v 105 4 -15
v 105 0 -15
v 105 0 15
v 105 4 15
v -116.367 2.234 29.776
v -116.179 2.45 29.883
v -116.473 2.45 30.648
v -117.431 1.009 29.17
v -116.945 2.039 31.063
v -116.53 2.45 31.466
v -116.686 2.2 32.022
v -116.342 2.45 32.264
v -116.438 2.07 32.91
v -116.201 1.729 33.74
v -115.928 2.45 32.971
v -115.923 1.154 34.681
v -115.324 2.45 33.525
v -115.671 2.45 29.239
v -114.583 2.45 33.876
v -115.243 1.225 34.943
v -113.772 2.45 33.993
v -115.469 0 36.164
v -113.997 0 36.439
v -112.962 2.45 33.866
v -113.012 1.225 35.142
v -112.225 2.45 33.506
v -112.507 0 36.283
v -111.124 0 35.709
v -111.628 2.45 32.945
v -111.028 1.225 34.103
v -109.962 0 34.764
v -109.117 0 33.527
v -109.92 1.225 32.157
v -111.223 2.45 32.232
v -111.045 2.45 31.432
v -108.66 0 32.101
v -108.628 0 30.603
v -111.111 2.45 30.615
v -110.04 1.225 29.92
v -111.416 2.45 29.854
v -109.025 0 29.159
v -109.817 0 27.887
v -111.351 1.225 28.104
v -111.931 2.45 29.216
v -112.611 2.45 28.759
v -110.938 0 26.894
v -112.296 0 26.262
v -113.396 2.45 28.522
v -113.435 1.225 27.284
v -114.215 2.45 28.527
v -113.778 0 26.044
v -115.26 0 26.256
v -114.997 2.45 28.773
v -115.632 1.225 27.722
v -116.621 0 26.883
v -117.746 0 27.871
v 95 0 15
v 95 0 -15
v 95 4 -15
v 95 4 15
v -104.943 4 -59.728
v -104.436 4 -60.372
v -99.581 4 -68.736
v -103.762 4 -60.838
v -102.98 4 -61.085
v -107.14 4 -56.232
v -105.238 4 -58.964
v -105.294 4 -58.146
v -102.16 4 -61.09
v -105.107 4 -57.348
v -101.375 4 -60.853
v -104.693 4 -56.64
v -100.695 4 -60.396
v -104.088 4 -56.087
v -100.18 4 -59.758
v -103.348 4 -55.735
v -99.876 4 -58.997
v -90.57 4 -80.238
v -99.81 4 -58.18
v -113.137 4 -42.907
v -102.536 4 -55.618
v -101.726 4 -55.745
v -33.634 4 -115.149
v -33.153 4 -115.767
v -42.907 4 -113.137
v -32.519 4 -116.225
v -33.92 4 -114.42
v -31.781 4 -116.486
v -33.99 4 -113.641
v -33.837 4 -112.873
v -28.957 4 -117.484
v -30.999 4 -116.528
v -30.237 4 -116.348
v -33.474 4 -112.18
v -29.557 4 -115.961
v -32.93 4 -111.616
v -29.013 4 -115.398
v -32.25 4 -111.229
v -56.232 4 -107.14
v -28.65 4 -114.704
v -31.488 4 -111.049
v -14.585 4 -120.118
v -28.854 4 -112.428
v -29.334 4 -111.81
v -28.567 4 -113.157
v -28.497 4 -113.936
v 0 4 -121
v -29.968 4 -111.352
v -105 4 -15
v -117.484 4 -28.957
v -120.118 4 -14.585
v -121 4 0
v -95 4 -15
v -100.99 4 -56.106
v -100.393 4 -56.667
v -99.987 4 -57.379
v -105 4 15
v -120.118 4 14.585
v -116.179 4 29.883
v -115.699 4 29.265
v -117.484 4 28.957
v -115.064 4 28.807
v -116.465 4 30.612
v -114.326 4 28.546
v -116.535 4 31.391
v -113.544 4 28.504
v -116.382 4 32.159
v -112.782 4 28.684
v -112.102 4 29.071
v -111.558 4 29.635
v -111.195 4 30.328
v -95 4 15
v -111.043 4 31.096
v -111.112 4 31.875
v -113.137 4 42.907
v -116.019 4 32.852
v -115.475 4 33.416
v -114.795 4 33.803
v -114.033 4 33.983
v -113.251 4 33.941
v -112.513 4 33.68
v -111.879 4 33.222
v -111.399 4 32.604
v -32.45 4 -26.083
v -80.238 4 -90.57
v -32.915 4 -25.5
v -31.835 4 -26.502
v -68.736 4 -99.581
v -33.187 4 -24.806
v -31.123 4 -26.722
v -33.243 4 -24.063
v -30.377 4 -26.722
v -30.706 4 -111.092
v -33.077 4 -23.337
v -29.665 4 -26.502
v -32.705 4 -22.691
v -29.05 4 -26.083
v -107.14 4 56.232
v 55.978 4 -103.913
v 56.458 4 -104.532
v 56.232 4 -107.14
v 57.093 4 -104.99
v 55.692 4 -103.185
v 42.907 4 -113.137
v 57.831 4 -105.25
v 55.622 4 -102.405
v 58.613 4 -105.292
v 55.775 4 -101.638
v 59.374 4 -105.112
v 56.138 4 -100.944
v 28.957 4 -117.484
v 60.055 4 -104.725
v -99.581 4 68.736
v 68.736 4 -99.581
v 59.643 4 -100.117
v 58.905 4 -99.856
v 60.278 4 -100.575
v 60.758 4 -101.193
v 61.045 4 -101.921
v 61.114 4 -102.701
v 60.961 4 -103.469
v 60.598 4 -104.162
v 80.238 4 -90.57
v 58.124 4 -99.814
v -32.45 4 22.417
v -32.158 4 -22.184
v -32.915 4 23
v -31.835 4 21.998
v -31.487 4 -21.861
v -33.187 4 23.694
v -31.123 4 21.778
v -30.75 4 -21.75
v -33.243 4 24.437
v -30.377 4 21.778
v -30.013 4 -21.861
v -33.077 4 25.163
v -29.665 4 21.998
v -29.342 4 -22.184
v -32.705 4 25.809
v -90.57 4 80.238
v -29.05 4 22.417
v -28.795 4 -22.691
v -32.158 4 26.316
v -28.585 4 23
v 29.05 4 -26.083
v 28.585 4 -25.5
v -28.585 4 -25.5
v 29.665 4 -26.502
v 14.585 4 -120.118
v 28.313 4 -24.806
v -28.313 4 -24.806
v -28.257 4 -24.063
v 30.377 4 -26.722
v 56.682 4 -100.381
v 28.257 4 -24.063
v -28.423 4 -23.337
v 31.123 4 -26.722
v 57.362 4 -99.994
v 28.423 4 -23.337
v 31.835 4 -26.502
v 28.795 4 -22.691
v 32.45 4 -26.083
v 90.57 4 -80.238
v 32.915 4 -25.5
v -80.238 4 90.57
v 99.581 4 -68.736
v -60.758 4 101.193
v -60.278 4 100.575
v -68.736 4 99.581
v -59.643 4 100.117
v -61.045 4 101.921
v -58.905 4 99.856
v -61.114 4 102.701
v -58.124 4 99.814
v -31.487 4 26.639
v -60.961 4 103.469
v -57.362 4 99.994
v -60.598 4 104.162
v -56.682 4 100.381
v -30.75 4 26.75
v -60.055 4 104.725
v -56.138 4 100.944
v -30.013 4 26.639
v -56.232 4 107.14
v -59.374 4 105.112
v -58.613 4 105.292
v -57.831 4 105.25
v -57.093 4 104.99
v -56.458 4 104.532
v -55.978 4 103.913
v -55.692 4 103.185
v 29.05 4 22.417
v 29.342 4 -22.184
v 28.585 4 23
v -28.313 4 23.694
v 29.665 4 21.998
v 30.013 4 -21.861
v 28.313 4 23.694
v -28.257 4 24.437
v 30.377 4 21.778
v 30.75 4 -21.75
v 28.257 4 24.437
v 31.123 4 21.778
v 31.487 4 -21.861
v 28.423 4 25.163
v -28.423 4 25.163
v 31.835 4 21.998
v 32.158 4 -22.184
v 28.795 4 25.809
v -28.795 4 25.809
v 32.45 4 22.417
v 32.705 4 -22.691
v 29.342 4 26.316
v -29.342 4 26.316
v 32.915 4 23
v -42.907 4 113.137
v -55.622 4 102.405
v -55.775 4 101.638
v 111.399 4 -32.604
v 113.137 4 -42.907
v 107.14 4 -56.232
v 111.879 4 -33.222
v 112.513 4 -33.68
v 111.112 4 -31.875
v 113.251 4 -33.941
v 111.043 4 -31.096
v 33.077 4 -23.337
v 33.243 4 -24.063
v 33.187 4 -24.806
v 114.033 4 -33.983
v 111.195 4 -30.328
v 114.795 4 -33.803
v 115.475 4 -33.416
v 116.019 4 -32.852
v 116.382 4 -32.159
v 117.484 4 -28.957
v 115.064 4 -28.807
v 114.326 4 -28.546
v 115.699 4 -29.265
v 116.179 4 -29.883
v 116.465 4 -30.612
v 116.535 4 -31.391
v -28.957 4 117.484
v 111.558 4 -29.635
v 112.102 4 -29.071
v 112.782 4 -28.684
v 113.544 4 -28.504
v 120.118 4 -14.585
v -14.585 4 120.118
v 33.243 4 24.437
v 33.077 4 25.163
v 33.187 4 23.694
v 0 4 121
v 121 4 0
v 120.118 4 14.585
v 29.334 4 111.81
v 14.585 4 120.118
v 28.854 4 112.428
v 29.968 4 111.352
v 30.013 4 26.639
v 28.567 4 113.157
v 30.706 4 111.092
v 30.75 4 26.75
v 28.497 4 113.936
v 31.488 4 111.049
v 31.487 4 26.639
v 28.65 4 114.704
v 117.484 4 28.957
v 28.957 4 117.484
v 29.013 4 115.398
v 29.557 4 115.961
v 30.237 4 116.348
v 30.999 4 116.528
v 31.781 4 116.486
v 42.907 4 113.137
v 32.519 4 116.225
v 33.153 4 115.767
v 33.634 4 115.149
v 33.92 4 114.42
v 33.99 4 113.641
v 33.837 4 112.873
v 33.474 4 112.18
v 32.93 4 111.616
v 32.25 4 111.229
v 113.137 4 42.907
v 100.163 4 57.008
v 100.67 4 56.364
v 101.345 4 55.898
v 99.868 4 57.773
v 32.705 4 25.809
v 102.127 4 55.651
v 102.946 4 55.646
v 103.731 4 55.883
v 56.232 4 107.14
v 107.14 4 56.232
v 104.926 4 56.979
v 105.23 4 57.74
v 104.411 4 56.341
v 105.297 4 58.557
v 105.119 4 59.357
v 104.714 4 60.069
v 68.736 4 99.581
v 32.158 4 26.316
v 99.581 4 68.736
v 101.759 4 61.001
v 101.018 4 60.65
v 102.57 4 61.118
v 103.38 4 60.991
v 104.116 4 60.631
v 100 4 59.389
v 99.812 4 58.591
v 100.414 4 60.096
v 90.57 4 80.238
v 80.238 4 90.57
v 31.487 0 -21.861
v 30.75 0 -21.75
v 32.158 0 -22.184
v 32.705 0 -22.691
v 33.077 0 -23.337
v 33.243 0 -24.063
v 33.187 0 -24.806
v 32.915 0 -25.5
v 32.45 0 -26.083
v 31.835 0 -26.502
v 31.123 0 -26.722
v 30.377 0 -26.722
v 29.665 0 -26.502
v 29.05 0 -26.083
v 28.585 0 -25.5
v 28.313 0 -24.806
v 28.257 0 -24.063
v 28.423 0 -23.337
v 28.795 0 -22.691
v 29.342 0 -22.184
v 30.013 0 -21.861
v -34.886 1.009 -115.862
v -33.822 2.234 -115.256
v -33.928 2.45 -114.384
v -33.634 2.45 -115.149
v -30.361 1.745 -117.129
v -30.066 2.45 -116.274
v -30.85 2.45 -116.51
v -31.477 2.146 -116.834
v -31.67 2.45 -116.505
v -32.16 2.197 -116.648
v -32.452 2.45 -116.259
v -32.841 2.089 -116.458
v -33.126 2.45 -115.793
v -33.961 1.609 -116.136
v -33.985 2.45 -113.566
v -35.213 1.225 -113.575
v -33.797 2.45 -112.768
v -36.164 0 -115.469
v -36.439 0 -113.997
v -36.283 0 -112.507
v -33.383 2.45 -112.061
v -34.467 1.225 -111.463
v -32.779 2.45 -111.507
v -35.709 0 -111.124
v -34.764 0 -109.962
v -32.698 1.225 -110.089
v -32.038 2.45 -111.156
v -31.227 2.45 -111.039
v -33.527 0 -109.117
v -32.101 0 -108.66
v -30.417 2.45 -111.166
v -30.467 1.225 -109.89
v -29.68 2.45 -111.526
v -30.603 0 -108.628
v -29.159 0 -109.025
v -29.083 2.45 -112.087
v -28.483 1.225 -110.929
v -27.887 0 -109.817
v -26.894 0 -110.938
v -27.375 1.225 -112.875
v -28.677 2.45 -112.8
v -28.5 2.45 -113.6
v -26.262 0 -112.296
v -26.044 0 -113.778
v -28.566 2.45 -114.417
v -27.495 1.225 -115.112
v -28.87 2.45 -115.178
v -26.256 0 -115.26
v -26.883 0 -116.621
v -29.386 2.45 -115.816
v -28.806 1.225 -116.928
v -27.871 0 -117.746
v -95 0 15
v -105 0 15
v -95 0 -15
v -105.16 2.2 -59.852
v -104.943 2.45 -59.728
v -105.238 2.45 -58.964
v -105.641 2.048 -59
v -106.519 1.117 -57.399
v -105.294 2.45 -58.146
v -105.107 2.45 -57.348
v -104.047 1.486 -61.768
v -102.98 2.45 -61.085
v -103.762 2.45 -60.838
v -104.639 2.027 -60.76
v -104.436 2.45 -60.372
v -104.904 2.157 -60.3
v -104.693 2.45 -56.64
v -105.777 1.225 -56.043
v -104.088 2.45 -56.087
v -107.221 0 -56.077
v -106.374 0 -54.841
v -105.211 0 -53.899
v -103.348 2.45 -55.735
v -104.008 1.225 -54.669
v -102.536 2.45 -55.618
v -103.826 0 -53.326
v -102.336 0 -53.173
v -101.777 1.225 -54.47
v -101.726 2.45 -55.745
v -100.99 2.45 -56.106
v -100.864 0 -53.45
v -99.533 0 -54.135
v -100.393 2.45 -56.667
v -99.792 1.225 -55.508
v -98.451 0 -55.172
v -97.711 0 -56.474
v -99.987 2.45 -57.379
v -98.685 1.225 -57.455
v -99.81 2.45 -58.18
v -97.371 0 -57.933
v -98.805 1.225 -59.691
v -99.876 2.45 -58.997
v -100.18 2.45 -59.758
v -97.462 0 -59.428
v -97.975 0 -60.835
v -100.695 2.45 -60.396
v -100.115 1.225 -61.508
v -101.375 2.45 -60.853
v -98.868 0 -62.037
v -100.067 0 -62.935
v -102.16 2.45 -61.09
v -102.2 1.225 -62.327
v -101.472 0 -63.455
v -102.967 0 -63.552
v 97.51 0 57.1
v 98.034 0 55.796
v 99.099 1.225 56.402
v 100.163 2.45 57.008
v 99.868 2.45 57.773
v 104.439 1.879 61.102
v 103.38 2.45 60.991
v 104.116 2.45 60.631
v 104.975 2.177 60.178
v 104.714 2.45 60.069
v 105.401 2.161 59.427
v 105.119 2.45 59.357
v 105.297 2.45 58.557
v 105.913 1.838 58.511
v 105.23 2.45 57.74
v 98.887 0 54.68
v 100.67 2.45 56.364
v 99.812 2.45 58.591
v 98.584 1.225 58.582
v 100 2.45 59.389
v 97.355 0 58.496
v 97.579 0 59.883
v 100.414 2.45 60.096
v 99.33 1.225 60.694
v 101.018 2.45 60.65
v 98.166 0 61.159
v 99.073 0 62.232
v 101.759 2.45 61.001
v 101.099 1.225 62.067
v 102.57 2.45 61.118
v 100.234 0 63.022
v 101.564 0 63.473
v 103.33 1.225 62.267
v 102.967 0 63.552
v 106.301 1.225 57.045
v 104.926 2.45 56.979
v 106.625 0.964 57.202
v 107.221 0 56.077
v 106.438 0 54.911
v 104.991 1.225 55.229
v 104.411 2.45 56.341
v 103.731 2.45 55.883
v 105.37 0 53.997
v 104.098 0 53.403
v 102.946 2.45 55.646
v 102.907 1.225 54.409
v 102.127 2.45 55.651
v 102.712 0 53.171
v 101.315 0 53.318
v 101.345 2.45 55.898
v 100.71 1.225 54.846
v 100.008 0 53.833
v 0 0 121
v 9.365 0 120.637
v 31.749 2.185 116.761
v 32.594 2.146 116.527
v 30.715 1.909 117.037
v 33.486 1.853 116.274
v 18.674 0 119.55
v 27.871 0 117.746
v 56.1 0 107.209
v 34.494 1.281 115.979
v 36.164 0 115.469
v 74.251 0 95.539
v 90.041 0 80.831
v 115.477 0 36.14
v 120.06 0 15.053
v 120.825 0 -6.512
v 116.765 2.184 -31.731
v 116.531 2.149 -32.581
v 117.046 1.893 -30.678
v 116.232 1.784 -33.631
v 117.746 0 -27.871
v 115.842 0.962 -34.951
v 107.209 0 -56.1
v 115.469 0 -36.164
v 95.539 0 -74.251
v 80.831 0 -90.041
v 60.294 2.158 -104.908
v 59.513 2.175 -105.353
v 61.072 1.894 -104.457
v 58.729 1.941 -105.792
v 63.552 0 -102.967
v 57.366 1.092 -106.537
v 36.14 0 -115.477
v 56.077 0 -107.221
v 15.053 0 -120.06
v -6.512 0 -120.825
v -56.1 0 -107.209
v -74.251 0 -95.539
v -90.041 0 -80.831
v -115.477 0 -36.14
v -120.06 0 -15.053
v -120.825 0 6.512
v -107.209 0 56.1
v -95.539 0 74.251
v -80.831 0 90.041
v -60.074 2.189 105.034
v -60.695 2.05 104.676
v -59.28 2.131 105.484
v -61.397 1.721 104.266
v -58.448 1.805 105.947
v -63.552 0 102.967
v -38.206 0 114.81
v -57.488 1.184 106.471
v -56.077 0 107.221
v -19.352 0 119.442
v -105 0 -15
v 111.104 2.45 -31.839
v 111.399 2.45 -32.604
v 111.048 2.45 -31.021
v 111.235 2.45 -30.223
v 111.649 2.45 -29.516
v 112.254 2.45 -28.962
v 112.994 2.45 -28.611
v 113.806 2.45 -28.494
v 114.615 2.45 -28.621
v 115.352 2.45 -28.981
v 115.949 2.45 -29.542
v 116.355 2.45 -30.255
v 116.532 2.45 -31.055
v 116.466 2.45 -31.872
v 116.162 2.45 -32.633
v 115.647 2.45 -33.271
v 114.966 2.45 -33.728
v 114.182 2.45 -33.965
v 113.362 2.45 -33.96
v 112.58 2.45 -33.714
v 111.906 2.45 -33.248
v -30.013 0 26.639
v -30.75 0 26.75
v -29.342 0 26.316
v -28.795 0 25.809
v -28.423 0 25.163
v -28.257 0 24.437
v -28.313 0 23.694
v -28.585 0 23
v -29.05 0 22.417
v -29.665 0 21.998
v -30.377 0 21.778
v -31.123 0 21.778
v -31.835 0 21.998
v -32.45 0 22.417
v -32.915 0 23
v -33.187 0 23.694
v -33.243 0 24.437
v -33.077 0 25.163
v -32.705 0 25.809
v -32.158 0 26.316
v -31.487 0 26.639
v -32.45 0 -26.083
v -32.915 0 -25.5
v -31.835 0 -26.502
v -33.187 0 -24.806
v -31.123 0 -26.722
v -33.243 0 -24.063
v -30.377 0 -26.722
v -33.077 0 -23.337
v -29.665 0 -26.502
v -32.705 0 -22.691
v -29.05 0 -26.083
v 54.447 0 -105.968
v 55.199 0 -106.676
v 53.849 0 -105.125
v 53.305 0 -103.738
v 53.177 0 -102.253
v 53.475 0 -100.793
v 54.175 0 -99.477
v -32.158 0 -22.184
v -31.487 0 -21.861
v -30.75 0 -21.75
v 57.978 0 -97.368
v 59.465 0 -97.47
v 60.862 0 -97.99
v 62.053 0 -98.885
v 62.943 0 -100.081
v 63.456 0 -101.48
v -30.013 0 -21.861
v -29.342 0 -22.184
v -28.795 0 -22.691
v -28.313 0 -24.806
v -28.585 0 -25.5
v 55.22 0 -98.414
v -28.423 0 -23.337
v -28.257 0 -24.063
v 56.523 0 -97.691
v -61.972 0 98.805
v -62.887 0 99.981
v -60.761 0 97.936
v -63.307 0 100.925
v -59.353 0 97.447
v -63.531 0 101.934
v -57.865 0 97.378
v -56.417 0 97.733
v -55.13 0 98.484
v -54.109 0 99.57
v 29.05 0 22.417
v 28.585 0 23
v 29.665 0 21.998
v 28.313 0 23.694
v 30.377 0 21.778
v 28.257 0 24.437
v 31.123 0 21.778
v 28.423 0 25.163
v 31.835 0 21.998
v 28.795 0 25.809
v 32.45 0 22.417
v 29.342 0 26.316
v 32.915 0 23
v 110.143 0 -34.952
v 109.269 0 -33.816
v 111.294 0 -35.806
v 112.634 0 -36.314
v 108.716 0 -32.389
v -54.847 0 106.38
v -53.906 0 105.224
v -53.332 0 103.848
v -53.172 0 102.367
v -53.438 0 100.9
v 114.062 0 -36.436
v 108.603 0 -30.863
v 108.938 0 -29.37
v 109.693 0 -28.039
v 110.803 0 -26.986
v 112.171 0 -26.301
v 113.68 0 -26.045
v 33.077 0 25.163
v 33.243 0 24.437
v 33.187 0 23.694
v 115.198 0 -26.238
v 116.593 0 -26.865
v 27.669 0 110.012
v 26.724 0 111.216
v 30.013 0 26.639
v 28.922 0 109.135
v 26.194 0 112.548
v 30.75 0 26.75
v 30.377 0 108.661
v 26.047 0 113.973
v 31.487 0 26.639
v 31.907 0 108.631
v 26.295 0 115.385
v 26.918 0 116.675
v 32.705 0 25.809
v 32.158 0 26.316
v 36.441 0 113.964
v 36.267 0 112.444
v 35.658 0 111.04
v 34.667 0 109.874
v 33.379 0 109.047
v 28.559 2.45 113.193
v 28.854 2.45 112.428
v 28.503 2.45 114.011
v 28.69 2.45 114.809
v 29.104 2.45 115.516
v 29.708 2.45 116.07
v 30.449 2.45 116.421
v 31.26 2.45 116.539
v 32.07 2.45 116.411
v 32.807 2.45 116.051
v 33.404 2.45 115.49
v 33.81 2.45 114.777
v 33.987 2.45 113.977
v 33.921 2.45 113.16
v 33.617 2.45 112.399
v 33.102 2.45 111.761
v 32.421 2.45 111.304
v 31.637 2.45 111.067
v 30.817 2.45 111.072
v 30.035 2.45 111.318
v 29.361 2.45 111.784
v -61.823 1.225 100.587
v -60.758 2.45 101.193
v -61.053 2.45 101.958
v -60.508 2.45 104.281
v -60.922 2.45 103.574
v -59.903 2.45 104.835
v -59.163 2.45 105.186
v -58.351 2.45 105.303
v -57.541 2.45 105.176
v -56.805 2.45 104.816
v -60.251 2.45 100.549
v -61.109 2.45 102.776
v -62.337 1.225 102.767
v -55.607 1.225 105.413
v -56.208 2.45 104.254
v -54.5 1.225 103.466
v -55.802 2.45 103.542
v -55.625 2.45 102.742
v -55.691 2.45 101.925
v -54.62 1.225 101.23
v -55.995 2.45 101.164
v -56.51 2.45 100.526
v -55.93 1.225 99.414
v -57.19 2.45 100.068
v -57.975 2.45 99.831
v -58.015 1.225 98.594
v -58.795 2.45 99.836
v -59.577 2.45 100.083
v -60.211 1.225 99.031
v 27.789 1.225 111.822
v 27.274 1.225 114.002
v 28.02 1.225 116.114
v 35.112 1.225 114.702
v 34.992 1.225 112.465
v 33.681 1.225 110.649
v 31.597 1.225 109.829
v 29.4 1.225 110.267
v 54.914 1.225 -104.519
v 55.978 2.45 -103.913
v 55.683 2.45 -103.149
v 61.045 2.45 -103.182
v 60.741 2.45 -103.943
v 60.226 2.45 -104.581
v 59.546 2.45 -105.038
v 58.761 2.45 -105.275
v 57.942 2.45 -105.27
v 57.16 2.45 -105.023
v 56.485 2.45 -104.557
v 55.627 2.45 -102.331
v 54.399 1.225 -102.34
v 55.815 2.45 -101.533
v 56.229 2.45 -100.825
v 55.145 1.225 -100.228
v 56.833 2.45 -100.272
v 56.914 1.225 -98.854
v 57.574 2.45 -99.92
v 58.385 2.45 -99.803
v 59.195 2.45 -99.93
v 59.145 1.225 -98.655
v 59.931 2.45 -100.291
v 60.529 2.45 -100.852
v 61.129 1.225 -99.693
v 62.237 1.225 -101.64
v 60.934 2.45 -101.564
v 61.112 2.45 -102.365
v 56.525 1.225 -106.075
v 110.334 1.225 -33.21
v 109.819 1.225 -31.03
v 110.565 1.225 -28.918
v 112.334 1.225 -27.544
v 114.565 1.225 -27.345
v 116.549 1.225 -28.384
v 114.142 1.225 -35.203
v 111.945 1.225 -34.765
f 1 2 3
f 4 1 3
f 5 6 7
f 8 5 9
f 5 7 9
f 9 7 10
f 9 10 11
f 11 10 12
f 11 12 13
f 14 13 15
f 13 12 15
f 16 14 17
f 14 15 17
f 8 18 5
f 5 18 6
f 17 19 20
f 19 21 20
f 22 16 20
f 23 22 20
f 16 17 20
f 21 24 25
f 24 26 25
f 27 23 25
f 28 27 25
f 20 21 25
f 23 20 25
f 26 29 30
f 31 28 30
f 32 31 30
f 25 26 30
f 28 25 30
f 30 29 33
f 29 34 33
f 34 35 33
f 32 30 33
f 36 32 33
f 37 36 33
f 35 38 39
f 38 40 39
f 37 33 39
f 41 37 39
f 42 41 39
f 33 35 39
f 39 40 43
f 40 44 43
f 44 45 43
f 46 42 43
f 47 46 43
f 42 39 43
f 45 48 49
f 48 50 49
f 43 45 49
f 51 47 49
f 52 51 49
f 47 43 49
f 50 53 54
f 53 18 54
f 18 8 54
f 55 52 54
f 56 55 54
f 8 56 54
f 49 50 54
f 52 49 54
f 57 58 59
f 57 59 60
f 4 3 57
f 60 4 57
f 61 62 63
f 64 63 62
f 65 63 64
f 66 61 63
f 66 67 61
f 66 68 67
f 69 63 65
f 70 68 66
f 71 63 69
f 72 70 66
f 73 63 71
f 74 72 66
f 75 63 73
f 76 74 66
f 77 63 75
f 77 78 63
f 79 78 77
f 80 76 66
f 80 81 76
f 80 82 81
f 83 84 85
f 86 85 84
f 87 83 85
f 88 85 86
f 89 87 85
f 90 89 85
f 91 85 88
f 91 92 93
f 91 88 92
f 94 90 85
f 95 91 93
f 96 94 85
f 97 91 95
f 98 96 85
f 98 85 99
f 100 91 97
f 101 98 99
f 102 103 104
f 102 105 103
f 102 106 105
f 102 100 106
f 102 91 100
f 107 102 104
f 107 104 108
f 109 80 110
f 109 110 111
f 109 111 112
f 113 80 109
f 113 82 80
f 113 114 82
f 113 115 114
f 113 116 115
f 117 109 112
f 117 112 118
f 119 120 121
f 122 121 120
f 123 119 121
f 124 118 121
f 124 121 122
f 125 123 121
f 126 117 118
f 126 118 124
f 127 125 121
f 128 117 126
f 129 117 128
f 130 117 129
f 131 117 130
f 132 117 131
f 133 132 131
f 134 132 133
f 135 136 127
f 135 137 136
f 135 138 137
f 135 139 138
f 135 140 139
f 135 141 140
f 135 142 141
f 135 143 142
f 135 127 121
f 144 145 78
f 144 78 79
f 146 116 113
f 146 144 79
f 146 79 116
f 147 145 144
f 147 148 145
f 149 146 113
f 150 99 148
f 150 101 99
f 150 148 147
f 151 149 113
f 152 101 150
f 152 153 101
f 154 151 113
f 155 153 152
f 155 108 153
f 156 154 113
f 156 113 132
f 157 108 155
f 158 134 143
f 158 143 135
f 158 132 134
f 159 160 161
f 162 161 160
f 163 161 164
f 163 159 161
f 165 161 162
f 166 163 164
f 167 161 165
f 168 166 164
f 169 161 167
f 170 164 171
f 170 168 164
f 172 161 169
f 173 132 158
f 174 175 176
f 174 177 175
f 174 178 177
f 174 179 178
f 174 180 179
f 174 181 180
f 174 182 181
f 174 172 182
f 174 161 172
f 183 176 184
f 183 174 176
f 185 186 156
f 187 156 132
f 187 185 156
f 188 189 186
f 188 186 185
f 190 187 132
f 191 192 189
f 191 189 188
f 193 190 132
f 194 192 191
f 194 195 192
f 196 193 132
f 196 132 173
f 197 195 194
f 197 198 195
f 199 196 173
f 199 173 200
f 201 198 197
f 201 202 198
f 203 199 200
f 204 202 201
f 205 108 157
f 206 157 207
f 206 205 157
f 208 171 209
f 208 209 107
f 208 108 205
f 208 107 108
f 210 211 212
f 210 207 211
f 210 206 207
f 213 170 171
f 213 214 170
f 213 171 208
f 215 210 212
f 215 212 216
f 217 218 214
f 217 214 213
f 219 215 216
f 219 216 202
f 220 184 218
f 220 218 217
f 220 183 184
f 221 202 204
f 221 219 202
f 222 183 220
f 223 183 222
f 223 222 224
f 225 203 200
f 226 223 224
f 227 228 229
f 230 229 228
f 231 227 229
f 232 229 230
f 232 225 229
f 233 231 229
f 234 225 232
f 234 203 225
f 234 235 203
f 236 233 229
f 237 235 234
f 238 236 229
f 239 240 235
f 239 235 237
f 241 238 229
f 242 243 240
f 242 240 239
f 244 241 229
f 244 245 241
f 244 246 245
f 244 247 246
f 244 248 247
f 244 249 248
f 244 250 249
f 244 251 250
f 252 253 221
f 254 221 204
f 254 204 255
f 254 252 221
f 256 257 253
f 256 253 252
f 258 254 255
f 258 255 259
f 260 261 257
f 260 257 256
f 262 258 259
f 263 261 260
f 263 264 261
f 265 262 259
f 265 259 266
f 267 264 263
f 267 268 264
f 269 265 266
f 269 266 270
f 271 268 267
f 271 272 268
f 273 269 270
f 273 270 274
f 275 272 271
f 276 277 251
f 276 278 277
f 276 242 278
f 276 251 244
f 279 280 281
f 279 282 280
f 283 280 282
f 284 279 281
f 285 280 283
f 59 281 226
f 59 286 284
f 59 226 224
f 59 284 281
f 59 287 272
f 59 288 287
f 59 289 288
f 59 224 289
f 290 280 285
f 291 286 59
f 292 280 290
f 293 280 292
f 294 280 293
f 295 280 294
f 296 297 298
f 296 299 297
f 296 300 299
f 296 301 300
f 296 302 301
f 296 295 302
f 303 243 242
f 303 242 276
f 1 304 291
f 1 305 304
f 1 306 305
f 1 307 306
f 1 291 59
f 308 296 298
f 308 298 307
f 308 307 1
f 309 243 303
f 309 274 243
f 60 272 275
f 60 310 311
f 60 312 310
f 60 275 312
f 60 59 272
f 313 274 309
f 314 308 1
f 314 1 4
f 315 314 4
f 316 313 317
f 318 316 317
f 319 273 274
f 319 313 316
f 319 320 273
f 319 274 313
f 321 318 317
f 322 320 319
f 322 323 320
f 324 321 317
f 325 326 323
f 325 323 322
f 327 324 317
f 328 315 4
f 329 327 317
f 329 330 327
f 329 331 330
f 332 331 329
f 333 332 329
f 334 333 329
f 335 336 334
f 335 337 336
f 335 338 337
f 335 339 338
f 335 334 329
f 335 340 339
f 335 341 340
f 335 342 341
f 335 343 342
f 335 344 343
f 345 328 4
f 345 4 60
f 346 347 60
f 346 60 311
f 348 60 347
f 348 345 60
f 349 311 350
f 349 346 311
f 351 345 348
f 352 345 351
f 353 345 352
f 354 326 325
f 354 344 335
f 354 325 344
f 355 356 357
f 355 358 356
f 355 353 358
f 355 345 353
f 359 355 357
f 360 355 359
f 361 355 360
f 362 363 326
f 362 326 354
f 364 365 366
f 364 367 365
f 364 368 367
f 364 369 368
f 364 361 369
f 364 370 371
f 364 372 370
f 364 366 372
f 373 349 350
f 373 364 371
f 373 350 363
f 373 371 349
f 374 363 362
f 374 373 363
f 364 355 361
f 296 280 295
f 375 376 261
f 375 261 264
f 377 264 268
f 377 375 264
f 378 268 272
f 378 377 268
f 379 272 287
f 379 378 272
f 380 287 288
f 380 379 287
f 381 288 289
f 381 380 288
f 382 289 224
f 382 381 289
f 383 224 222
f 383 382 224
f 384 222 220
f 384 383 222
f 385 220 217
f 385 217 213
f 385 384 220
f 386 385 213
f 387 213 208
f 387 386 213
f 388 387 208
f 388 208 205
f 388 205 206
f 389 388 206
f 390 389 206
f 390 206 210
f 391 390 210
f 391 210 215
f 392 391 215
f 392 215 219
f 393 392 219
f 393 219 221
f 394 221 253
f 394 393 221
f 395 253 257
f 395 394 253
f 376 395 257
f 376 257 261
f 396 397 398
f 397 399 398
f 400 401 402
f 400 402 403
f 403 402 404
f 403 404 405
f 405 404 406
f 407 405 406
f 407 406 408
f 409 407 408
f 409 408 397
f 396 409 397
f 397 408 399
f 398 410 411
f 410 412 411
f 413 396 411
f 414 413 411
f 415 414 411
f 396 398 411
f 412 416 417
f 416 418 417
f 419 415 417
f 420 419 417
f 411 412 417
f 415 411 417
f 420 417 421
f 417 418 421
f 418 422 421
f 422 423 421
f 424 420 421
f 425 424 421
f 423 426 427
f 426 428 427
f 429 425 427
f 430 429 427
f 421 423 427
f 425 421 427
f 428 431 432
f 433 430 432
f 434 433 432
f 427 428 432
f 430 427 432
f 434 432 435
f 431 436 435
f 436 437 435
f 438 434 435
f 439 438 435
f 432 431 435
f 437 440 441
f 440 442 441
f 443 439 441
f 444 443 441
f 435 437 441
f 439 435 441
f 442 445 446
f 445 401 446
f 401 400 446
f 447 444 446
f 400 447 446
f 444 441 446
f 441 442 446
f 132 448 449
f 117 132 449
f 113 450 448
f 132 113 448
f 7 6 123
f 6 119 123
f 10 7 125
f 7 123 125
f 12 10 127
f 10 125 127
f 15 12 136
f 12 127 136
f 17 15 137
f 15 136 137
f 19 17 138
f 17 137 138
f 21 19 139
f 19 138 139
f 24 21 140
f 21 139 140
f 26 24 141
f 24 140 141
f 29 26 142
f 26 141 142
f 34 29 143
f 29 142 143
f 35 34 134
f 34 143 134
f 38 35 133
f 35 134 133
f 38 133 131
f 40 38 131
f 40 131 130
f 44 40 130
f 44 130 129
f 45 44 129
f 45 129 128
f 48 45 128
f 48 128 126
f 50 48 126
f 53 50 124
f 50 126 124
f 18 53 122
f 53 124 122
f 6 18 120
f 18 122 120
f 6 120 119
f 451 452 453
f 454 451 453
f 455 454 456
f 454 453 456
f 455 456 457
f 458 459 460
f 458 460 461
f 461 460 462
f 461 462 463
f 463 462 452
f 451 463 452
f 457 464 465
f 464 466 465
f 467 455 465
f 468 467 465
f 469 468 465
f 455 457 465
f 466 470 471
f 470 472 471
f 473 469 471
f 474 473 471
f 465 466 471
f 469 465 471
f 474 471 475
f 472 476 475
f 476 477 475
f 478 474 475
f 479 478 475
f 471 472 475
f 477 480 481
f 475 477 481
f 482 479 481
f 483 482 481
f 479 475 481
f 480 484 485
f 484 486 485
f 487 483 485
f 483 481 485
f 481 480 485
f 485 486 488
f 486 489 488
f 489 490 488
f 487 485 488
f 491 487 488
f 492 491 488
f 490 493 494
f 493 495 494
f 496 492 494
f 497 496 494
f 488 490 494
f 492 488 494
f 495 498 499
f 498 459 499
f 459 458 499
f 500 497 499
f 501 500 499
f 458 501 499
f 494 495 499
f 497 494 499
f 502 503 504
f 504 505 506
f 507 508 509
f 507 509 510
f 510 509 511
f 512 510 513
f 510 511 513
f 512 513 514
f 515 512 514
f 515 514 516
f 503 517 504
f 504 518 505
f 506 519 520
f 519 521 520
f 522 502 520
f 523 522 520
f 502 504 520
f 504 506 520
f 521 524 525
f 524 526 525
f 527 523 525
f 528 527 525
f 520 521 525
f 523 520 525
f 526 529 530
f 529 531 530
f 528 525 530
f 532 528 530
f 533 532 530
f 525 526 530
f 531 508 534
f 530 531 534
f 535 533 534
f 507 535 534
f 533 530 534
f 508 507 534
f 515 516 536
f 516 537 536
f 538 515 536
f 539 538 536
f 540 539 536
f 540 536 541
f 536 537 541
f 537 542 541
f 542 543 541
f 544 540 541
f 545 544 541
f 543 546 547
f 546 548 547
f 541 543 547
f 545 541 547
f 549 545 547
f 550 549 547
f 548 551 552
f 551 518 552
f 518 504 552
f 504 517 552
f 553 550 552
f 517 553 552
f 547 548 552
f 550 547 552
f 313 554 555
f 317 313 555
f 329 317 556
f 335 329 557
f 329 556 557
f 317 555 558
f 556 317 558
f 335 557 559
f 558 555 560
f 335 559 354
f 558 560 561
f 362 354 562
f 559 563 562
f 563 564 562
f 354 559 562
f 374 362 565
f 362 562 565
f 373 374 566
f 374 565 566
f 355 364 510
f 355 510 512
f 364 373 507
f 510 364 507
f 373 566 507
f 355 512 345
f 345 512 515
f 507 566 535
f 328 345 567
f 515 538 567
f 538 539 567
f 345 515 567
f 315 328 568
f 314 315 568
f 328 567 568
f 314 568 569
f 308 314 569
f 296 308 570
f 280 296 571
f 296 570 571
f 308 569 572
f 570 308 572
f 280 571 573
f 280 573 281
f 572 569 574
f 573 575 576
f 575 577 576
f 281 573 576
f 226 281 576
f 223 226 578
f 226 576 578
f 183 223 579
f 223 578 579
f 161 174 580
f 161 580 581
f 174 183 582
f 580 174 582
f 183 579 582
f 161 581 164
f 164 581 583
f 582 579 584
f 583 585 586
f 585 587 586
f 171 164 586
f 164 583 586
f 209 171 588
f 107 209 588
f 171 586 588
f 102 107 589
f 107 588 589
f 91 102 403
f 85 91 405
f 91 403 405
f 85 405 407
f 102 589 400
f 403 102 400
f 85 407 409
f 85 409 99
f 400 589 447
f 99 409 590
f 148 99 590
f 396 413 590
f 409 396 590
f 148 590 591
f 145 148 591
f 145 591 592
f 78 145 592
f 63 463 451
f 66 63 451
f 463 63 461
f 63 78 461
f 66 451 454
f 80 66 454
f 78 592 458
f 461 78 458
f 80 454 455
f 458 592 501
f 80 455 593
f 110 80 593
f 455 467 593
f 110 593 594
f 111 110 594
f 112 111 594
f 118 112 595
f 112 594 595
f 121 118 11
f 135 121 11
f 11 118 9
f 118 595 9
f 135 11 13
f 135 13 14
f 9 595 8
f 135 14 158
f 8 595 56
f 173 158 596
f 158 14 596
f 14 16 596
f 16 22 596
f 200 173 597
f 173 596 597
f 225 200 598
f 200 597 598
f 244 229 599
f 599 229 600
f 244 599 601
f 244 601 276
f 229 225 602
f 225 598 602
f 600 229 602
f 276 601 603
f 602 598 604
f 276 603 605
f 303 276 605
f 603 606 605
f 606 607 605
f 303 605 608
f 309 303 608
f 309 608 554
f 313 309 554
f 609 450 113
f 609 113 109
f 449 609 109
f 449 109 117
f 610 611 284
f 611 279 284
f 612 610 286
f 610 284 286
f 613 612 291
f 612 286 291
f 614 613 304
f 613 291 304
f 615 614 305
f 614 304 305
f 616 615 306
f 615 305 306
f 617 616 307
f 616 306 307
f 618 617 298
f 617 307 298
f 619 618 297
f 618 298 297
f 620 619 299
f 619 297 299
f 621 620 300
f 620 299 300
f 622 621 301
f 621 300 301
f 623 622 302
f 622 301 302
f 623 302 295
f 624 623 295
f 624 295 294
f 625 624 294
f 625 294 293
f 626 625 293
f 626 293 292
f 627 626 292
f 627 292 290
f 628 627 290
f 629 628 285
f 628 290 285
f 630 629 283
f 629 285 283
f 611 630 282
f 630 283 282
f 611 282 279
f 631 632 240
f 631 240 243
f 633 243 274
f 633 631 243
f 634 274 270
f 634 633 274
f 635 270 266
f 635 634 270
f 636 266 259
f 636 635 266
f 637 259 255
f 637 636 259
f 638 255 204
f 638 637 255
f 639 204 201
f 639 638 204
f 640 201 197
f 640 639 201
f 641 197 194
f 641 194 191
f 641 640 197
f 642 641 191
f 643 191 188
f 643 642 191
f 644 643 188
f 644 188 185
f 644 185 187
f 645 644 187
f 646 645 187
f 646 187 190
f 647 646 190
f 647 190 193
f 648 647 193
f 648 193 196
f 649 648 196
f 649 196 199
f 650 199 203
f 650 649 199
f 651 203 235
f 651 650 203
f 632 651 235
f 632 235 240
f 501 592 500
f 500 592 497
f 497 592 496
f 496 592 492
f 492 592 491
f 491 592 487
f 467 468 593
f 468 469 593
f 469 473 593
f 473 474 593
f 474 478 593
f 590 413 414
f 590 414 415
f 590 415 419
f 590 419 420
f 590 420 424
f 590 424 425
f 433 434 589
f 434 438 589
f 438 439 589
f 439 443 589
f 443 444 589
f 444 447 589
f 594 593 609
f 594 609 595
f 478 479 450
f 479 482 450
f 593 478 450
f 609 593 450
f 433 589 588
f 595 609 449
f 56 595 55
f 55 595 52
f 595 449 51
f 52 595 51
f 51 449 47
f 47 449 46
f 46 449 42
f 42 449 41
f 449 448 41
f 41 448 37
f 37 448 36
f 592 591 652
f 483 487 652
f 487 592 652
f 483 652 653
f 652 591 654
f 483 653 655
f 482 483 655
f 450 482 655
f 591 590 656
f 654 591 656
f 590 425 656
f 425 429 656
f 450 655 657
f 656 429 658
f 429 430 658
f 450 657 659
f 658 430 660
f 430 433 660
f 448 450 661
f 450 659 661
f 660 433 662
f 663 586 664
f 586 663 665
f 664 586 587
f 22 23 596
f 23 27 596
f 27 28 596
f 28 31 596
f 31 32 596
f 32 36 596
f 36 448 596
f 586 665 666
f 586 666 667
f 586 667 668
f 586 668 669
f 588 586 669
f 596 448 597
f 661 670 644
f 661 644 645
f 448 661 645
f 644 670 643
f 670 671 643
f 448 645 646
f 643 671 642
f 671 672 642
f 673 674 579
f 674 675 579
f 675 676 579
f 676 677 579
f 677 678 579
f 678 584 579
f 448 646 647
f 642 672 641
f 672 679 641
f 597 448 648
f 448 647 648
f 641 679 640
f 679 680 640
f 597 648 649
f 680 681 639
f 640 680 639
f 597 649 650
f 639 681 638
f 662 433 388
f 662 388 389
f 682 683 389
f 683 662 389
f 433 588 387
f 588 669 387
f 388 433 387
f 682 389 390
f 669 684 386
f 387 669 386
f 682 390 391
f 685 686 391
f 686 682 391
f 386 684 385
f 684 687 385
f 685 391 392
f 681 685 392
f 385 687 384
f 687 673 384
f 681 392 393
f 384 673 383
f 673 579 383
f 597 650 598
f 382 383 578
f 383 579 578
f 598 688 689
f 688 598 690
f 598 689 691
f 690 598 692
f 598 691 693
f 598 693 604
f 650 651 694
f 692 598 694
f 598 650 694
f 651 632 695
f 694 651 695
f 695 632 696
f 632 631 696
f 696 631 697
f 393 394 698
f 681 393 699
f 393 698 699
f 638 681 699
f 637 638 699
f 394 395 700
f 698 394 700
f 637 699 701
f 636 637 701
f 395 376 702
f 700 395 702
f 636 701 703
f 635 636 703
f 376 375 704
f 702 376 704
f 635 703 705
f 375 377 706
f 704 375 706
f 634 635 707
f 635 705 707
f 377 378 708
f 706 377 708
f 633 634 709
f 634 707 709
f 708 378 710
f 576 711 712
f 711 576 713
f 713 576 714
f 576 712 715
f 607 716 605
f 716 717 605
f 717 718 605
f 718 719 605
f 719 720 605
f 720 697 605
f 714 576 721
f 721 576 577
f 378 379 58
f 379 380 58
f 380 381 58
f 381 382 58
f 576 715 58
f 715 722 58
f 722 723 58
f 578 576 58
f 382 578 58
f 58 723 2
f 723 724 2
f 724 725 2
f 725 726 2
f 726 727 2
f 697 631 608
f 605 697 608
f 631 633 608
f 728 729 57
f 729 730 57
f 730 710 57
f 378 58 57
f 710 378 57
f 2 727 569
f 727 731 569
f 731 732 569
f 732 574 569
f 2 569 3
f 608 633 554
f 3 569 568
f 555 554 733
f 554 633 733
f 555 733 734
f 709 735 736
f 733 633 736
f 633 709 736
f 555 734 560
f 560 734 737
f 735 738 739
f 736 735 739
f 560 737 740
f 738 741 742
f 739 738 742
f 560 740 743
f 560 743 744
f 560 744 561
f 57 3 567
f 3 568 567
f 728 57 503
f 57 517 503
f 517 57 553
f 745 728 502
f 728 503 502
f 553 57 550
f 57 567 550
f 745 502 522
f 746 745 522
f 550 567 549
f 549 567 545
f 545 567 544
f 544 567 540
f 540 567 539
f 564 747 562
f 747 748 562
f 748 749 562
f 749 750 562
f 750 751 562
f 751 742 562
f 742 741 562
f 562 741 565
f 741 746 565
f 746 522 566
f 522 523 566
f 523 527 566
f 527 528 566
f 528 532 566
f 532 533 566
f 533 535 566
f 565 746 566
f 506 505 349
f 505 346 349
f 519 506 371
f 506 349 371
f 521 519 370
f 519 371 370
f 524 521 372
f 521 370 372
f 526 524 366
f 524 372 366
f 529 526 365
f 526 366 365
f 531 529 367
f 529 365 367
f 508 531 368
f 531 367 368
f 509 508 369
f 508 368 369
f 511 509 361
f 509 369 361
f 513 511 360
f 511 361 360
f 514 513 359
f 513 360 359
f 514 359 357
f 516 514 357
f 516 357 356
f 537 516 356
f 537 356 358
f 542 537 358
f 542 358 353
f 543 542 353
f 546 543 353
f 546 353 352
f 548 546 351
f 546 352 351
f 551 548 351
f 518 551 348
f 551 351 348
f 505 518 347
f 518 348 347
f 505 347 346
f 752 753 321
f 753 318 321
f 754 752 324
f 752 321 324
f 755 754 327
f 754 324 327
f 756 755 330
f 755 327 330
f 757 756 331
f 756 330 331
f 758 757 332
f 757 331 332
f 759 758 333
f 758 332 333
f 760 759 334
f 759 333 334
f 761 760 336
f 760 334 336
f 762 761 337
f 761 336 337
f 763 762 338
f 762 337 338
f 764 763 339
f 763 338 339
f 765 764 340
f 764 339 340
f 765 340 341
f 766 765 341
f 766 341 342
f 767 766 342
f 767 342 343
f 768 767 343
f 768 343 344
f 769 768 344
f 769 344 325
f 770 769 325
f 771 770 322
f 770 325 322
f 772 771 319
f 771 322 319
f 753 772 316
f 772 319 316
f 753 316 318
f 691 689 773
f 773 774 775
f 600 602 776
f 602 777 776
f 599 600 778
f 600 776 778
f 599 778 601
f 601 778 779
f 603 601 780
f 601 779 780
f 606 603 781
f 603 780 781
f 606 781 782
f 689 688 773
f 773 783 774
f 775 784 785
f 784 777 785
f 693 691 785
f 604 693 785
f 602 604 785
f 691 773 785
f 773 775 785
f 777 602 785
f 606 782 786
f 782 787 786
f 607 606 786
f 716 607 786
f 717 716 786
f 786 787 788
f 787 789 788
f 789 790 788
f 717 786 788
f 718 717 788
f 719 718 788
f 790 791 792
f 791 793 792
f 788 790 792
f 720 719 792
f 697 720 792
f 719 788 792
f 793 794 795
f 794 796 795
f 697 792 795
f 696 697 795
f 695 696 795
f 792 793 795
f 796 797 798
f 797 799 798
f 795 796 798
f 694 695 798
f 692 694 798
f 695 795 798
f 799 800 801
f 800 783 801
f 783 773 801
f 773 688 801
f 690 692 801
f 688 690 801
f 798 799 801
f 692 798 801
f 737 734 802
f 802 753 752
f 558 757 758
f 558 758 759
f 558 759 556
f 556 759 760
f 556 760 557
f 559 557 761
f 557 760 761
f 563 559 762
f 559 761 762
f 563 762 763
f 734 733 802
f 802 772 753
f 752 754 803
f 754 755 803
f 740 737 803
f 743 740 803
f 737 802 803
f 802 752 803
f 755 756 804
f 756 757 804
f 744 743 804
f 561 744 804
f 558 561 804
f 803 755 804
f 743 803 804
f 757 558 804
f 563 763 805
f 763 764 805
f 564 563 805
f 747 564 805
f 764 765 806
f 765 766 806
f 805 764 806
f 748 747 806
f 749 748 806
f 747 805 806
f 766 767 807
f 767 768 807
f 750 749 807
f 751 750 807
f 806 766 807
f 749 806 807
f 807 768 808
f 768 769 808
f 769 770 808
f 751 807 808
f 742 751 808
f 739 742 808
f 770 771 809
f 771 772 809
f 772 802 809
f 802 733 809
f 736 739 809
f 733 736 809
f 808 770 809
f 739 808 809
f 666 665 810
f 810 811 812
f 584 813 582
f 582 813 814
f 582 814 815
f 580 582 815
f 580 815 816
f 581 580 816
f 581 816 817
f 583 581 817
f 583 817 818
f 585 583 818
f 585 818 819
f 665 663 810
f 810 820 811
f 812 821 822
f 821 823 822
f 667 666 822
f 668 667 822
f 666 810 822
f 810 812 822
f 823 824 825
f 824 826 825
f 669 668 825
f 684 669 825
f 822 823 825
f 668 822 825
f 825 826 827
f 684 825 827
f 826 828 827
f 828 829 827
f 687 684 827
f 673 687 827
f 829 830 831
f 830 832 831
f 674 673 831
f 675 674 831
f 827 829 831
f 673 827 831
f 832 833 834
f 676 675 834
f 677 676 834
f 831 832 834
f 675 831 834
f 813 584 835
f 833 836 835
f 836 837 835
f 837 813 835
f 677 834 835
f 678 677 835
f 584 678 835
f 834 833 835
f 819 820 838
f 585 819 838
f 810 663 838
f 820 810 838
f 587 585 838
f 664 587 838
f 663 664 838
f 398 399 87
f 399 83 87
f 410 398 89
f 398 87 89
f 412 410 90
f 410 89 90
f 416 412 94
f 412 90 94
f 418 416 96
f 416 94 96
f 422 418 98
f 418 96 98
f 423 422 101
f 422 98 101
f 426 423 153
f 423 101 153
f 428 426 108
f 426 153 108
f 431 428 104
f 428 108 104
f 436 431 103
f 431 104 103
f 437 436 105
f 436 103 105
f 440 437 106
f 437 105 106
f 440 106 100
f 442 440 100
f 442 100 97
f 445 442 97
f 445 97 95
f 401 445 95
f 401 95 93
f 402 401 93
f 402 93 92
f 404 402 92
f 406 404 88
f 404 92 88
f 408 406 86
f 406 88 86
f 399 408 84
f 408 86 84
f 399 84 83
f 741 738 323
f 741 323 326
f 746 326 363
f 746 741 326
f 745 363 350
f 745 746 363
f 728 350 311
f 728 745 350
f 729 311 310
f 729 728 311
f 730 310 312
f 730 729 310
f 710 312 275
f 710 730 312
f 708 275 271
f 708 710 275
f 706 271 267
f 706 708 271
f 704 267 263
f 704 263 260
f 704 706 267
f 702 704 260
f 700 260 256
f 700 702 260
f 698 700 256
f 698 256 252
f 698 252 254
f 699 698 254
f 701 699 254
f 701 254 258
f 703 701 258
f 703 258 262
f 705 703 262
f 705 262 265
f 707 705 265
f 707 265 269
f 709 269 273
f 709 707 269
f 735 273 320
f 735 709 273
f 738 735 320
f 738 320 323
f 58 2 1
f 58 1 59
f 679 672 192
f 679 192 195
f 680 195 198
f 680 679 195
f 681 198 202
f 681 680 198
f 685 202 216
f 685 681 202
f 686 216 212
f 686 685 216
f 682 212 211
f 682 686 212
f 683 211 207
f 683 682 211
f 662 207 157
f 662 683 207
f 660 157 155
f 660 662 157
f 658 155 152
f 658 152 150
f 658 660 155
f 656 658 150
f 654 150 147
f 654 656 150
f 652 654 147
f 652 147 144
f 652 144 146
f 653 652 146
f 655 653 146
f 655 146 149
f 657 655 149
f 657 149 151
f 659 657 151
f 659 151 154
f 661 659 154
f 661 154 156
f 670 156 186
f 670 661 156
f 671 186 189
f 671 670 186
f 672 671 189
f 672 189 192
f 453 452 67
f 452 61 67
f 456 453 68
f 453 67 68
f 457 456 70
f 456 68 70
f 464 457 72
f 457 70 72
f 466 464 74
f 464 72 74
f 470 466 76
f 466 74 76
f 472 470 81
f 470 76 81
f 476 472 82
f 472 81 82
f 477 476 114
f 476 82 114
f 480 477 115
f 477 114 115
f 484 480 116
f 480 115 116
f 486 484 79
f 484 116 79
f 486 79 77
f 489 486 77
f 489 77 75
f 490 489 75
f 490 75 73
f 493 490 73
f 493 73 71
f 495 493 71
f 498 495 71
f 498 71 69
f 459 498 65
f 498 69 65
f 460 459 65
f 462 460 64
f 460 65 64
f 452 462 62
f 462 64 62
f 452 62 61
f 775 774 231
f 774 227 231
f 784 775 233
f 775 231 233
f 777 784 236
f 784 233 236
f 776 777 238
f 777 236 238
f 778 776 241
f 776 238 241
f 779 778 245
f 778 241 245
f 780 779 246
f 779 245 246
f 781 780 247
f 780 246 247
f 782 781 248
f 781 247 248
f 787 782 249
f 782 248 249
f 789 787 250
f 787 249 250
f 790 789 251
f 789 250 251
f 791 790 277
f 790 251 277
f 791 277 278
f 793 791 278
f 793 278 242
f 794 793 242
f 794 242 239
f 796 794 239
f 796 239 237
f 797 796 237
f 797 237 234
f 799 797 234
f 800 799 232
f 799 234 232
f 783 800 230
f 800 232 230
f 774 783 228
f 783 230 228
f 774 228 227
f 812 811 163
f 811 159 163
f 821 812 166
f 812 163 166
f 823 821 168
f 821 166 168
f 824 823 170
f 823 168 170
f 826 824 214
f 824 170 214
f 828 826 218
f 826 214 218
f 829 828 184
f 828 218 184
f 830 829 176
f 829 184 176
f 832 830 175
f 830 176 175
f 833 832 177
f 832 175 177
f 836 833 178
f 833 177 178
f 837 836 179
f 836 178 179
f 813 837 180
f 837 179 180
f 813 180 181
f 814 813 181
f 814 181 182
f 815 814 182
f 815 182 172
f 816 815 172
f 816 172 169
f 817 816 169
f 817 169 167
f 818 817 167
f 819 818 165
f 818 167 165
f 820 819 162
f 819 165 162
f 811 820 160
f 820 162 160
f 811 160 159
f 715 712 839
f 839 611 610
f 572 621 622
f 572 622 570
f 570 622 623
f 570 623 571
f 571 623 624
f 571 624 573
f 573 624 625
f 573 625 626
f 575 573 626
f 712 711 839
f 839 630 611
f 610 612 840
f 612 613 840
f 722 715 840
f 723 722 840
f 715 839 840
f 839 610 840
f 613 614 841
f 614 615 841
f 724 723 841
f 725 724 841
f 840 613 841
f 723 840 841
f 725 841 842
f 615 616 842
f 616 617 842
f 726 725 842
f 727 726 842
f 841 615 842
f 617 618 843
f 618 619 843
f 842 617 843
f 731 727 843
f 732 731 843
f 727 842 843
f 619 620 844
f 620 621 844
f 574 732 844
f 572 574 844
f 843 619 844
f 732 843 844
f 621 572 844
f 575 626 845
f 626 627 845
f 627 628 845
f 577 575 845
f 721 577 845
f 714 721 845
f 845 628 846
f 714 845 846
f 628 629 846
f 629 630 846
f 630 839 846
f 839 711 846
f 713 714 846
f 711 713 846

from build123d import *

# Parameters (mm, degrees)
BOTTOM_R                    = 121
BOTTOM_R_2                  = 2.5
BOTTOM_W                    = 10
BOTTOM_H                    = 30
BOTTOM_EXTRUDE_DEPTH        = 4
HOLE_WIZARD_827_D           = 5.5
HOLE_WIZARD_827_DEPTH       = 20
HOLE_WIZARD_827_CSINK_D     = 10.4
HOLE_WIZARD_827_CSINK_ANGLE = 90
HOLE_WIZARD_827_TIP         = 1.652366702


with BuildPart() as part:
    # Bottom → Bottom-Extrude (new body)
    with BuildSketch(Plane(origin=(0, 0, 0), x_dir=(-1, 0, 0), z_dir=(0, 1, 0))):
        with Locations(Location((0, 0, 0), (0, 0, 90))):
            Circle(BOTTOM_R)
        with Locations(Location((-30.75, -24.25, 0), (0, 0, 90))):
            Circle(BOTTOM_R_2, mode=Mode.SUBTRACT)
        with Locations(Location((30.75, -24.25, 0), (0, 0, 90))):
            Circle(BOTTOM_R_2, mode=Mode.SUBTRACT)
        with Locations(Location((30.75, 24.25, 0), (0, 0, 90))):
            Circle(BOTTOM_R_2, mode=Mode.SUBTRACT)
        with Locations(Location((-30.75, 24.25, 0), (0, 0, 90))):
            Circle(BOTTOM_R_2, mode=Mode.SUBTRACT)
        with Locations((100, 0)):
            Rectangle(BOTTOM_W, BOTTOM_H, mode=Mode.SUBTRACT)
        with Locations((-100, 0)):
            Rectangle(BOTTOM_W, BOTTOM_H, mode=Mode.SUBTRACT)
    extrude(amount=BOTTOM_EXTRUDE_DEPTH)

    # Hole Wizard 827
    with Locations(Plane(origin=(-40.138590538, 0, -6.235728401), x_dir=(0.8690947690911651, 0, 0.49464561287691045), z_dir=(0, -1, 0))):
        with Locations((-45.469885408, -97.873538962), (-80.031285228, -14.434938782), (-45.469885408, 69.003661398), (37.968714772, 103.565061218), (121.407314952, 69.003661398), (155.968714772, -14.434938782), (121.407314952, -97.873538962), (37.968714772, -132.434938782)):
            CounterSinkHole(HOLE_WIZARD_827_D / 2, HOLE_WIZARD_827_CSINK_D / 2, depth=HOLE_WIZARD_827_DEPTH, counter_sink_angle=HOLE_WIZARD_827_CSINK_ANGLE)
            with Locations((0, 0, -(HOLE_WIZARD_827_DEPTH + HOLE_WIZARD_827_TIP / 2))):  # 118° drill point
                Cone(0, HOLE_WIZARD_827_D / 2, HOLE_WIZARD_827_TIP, mode=Mode.SUBTRACT)


solid = part.part
